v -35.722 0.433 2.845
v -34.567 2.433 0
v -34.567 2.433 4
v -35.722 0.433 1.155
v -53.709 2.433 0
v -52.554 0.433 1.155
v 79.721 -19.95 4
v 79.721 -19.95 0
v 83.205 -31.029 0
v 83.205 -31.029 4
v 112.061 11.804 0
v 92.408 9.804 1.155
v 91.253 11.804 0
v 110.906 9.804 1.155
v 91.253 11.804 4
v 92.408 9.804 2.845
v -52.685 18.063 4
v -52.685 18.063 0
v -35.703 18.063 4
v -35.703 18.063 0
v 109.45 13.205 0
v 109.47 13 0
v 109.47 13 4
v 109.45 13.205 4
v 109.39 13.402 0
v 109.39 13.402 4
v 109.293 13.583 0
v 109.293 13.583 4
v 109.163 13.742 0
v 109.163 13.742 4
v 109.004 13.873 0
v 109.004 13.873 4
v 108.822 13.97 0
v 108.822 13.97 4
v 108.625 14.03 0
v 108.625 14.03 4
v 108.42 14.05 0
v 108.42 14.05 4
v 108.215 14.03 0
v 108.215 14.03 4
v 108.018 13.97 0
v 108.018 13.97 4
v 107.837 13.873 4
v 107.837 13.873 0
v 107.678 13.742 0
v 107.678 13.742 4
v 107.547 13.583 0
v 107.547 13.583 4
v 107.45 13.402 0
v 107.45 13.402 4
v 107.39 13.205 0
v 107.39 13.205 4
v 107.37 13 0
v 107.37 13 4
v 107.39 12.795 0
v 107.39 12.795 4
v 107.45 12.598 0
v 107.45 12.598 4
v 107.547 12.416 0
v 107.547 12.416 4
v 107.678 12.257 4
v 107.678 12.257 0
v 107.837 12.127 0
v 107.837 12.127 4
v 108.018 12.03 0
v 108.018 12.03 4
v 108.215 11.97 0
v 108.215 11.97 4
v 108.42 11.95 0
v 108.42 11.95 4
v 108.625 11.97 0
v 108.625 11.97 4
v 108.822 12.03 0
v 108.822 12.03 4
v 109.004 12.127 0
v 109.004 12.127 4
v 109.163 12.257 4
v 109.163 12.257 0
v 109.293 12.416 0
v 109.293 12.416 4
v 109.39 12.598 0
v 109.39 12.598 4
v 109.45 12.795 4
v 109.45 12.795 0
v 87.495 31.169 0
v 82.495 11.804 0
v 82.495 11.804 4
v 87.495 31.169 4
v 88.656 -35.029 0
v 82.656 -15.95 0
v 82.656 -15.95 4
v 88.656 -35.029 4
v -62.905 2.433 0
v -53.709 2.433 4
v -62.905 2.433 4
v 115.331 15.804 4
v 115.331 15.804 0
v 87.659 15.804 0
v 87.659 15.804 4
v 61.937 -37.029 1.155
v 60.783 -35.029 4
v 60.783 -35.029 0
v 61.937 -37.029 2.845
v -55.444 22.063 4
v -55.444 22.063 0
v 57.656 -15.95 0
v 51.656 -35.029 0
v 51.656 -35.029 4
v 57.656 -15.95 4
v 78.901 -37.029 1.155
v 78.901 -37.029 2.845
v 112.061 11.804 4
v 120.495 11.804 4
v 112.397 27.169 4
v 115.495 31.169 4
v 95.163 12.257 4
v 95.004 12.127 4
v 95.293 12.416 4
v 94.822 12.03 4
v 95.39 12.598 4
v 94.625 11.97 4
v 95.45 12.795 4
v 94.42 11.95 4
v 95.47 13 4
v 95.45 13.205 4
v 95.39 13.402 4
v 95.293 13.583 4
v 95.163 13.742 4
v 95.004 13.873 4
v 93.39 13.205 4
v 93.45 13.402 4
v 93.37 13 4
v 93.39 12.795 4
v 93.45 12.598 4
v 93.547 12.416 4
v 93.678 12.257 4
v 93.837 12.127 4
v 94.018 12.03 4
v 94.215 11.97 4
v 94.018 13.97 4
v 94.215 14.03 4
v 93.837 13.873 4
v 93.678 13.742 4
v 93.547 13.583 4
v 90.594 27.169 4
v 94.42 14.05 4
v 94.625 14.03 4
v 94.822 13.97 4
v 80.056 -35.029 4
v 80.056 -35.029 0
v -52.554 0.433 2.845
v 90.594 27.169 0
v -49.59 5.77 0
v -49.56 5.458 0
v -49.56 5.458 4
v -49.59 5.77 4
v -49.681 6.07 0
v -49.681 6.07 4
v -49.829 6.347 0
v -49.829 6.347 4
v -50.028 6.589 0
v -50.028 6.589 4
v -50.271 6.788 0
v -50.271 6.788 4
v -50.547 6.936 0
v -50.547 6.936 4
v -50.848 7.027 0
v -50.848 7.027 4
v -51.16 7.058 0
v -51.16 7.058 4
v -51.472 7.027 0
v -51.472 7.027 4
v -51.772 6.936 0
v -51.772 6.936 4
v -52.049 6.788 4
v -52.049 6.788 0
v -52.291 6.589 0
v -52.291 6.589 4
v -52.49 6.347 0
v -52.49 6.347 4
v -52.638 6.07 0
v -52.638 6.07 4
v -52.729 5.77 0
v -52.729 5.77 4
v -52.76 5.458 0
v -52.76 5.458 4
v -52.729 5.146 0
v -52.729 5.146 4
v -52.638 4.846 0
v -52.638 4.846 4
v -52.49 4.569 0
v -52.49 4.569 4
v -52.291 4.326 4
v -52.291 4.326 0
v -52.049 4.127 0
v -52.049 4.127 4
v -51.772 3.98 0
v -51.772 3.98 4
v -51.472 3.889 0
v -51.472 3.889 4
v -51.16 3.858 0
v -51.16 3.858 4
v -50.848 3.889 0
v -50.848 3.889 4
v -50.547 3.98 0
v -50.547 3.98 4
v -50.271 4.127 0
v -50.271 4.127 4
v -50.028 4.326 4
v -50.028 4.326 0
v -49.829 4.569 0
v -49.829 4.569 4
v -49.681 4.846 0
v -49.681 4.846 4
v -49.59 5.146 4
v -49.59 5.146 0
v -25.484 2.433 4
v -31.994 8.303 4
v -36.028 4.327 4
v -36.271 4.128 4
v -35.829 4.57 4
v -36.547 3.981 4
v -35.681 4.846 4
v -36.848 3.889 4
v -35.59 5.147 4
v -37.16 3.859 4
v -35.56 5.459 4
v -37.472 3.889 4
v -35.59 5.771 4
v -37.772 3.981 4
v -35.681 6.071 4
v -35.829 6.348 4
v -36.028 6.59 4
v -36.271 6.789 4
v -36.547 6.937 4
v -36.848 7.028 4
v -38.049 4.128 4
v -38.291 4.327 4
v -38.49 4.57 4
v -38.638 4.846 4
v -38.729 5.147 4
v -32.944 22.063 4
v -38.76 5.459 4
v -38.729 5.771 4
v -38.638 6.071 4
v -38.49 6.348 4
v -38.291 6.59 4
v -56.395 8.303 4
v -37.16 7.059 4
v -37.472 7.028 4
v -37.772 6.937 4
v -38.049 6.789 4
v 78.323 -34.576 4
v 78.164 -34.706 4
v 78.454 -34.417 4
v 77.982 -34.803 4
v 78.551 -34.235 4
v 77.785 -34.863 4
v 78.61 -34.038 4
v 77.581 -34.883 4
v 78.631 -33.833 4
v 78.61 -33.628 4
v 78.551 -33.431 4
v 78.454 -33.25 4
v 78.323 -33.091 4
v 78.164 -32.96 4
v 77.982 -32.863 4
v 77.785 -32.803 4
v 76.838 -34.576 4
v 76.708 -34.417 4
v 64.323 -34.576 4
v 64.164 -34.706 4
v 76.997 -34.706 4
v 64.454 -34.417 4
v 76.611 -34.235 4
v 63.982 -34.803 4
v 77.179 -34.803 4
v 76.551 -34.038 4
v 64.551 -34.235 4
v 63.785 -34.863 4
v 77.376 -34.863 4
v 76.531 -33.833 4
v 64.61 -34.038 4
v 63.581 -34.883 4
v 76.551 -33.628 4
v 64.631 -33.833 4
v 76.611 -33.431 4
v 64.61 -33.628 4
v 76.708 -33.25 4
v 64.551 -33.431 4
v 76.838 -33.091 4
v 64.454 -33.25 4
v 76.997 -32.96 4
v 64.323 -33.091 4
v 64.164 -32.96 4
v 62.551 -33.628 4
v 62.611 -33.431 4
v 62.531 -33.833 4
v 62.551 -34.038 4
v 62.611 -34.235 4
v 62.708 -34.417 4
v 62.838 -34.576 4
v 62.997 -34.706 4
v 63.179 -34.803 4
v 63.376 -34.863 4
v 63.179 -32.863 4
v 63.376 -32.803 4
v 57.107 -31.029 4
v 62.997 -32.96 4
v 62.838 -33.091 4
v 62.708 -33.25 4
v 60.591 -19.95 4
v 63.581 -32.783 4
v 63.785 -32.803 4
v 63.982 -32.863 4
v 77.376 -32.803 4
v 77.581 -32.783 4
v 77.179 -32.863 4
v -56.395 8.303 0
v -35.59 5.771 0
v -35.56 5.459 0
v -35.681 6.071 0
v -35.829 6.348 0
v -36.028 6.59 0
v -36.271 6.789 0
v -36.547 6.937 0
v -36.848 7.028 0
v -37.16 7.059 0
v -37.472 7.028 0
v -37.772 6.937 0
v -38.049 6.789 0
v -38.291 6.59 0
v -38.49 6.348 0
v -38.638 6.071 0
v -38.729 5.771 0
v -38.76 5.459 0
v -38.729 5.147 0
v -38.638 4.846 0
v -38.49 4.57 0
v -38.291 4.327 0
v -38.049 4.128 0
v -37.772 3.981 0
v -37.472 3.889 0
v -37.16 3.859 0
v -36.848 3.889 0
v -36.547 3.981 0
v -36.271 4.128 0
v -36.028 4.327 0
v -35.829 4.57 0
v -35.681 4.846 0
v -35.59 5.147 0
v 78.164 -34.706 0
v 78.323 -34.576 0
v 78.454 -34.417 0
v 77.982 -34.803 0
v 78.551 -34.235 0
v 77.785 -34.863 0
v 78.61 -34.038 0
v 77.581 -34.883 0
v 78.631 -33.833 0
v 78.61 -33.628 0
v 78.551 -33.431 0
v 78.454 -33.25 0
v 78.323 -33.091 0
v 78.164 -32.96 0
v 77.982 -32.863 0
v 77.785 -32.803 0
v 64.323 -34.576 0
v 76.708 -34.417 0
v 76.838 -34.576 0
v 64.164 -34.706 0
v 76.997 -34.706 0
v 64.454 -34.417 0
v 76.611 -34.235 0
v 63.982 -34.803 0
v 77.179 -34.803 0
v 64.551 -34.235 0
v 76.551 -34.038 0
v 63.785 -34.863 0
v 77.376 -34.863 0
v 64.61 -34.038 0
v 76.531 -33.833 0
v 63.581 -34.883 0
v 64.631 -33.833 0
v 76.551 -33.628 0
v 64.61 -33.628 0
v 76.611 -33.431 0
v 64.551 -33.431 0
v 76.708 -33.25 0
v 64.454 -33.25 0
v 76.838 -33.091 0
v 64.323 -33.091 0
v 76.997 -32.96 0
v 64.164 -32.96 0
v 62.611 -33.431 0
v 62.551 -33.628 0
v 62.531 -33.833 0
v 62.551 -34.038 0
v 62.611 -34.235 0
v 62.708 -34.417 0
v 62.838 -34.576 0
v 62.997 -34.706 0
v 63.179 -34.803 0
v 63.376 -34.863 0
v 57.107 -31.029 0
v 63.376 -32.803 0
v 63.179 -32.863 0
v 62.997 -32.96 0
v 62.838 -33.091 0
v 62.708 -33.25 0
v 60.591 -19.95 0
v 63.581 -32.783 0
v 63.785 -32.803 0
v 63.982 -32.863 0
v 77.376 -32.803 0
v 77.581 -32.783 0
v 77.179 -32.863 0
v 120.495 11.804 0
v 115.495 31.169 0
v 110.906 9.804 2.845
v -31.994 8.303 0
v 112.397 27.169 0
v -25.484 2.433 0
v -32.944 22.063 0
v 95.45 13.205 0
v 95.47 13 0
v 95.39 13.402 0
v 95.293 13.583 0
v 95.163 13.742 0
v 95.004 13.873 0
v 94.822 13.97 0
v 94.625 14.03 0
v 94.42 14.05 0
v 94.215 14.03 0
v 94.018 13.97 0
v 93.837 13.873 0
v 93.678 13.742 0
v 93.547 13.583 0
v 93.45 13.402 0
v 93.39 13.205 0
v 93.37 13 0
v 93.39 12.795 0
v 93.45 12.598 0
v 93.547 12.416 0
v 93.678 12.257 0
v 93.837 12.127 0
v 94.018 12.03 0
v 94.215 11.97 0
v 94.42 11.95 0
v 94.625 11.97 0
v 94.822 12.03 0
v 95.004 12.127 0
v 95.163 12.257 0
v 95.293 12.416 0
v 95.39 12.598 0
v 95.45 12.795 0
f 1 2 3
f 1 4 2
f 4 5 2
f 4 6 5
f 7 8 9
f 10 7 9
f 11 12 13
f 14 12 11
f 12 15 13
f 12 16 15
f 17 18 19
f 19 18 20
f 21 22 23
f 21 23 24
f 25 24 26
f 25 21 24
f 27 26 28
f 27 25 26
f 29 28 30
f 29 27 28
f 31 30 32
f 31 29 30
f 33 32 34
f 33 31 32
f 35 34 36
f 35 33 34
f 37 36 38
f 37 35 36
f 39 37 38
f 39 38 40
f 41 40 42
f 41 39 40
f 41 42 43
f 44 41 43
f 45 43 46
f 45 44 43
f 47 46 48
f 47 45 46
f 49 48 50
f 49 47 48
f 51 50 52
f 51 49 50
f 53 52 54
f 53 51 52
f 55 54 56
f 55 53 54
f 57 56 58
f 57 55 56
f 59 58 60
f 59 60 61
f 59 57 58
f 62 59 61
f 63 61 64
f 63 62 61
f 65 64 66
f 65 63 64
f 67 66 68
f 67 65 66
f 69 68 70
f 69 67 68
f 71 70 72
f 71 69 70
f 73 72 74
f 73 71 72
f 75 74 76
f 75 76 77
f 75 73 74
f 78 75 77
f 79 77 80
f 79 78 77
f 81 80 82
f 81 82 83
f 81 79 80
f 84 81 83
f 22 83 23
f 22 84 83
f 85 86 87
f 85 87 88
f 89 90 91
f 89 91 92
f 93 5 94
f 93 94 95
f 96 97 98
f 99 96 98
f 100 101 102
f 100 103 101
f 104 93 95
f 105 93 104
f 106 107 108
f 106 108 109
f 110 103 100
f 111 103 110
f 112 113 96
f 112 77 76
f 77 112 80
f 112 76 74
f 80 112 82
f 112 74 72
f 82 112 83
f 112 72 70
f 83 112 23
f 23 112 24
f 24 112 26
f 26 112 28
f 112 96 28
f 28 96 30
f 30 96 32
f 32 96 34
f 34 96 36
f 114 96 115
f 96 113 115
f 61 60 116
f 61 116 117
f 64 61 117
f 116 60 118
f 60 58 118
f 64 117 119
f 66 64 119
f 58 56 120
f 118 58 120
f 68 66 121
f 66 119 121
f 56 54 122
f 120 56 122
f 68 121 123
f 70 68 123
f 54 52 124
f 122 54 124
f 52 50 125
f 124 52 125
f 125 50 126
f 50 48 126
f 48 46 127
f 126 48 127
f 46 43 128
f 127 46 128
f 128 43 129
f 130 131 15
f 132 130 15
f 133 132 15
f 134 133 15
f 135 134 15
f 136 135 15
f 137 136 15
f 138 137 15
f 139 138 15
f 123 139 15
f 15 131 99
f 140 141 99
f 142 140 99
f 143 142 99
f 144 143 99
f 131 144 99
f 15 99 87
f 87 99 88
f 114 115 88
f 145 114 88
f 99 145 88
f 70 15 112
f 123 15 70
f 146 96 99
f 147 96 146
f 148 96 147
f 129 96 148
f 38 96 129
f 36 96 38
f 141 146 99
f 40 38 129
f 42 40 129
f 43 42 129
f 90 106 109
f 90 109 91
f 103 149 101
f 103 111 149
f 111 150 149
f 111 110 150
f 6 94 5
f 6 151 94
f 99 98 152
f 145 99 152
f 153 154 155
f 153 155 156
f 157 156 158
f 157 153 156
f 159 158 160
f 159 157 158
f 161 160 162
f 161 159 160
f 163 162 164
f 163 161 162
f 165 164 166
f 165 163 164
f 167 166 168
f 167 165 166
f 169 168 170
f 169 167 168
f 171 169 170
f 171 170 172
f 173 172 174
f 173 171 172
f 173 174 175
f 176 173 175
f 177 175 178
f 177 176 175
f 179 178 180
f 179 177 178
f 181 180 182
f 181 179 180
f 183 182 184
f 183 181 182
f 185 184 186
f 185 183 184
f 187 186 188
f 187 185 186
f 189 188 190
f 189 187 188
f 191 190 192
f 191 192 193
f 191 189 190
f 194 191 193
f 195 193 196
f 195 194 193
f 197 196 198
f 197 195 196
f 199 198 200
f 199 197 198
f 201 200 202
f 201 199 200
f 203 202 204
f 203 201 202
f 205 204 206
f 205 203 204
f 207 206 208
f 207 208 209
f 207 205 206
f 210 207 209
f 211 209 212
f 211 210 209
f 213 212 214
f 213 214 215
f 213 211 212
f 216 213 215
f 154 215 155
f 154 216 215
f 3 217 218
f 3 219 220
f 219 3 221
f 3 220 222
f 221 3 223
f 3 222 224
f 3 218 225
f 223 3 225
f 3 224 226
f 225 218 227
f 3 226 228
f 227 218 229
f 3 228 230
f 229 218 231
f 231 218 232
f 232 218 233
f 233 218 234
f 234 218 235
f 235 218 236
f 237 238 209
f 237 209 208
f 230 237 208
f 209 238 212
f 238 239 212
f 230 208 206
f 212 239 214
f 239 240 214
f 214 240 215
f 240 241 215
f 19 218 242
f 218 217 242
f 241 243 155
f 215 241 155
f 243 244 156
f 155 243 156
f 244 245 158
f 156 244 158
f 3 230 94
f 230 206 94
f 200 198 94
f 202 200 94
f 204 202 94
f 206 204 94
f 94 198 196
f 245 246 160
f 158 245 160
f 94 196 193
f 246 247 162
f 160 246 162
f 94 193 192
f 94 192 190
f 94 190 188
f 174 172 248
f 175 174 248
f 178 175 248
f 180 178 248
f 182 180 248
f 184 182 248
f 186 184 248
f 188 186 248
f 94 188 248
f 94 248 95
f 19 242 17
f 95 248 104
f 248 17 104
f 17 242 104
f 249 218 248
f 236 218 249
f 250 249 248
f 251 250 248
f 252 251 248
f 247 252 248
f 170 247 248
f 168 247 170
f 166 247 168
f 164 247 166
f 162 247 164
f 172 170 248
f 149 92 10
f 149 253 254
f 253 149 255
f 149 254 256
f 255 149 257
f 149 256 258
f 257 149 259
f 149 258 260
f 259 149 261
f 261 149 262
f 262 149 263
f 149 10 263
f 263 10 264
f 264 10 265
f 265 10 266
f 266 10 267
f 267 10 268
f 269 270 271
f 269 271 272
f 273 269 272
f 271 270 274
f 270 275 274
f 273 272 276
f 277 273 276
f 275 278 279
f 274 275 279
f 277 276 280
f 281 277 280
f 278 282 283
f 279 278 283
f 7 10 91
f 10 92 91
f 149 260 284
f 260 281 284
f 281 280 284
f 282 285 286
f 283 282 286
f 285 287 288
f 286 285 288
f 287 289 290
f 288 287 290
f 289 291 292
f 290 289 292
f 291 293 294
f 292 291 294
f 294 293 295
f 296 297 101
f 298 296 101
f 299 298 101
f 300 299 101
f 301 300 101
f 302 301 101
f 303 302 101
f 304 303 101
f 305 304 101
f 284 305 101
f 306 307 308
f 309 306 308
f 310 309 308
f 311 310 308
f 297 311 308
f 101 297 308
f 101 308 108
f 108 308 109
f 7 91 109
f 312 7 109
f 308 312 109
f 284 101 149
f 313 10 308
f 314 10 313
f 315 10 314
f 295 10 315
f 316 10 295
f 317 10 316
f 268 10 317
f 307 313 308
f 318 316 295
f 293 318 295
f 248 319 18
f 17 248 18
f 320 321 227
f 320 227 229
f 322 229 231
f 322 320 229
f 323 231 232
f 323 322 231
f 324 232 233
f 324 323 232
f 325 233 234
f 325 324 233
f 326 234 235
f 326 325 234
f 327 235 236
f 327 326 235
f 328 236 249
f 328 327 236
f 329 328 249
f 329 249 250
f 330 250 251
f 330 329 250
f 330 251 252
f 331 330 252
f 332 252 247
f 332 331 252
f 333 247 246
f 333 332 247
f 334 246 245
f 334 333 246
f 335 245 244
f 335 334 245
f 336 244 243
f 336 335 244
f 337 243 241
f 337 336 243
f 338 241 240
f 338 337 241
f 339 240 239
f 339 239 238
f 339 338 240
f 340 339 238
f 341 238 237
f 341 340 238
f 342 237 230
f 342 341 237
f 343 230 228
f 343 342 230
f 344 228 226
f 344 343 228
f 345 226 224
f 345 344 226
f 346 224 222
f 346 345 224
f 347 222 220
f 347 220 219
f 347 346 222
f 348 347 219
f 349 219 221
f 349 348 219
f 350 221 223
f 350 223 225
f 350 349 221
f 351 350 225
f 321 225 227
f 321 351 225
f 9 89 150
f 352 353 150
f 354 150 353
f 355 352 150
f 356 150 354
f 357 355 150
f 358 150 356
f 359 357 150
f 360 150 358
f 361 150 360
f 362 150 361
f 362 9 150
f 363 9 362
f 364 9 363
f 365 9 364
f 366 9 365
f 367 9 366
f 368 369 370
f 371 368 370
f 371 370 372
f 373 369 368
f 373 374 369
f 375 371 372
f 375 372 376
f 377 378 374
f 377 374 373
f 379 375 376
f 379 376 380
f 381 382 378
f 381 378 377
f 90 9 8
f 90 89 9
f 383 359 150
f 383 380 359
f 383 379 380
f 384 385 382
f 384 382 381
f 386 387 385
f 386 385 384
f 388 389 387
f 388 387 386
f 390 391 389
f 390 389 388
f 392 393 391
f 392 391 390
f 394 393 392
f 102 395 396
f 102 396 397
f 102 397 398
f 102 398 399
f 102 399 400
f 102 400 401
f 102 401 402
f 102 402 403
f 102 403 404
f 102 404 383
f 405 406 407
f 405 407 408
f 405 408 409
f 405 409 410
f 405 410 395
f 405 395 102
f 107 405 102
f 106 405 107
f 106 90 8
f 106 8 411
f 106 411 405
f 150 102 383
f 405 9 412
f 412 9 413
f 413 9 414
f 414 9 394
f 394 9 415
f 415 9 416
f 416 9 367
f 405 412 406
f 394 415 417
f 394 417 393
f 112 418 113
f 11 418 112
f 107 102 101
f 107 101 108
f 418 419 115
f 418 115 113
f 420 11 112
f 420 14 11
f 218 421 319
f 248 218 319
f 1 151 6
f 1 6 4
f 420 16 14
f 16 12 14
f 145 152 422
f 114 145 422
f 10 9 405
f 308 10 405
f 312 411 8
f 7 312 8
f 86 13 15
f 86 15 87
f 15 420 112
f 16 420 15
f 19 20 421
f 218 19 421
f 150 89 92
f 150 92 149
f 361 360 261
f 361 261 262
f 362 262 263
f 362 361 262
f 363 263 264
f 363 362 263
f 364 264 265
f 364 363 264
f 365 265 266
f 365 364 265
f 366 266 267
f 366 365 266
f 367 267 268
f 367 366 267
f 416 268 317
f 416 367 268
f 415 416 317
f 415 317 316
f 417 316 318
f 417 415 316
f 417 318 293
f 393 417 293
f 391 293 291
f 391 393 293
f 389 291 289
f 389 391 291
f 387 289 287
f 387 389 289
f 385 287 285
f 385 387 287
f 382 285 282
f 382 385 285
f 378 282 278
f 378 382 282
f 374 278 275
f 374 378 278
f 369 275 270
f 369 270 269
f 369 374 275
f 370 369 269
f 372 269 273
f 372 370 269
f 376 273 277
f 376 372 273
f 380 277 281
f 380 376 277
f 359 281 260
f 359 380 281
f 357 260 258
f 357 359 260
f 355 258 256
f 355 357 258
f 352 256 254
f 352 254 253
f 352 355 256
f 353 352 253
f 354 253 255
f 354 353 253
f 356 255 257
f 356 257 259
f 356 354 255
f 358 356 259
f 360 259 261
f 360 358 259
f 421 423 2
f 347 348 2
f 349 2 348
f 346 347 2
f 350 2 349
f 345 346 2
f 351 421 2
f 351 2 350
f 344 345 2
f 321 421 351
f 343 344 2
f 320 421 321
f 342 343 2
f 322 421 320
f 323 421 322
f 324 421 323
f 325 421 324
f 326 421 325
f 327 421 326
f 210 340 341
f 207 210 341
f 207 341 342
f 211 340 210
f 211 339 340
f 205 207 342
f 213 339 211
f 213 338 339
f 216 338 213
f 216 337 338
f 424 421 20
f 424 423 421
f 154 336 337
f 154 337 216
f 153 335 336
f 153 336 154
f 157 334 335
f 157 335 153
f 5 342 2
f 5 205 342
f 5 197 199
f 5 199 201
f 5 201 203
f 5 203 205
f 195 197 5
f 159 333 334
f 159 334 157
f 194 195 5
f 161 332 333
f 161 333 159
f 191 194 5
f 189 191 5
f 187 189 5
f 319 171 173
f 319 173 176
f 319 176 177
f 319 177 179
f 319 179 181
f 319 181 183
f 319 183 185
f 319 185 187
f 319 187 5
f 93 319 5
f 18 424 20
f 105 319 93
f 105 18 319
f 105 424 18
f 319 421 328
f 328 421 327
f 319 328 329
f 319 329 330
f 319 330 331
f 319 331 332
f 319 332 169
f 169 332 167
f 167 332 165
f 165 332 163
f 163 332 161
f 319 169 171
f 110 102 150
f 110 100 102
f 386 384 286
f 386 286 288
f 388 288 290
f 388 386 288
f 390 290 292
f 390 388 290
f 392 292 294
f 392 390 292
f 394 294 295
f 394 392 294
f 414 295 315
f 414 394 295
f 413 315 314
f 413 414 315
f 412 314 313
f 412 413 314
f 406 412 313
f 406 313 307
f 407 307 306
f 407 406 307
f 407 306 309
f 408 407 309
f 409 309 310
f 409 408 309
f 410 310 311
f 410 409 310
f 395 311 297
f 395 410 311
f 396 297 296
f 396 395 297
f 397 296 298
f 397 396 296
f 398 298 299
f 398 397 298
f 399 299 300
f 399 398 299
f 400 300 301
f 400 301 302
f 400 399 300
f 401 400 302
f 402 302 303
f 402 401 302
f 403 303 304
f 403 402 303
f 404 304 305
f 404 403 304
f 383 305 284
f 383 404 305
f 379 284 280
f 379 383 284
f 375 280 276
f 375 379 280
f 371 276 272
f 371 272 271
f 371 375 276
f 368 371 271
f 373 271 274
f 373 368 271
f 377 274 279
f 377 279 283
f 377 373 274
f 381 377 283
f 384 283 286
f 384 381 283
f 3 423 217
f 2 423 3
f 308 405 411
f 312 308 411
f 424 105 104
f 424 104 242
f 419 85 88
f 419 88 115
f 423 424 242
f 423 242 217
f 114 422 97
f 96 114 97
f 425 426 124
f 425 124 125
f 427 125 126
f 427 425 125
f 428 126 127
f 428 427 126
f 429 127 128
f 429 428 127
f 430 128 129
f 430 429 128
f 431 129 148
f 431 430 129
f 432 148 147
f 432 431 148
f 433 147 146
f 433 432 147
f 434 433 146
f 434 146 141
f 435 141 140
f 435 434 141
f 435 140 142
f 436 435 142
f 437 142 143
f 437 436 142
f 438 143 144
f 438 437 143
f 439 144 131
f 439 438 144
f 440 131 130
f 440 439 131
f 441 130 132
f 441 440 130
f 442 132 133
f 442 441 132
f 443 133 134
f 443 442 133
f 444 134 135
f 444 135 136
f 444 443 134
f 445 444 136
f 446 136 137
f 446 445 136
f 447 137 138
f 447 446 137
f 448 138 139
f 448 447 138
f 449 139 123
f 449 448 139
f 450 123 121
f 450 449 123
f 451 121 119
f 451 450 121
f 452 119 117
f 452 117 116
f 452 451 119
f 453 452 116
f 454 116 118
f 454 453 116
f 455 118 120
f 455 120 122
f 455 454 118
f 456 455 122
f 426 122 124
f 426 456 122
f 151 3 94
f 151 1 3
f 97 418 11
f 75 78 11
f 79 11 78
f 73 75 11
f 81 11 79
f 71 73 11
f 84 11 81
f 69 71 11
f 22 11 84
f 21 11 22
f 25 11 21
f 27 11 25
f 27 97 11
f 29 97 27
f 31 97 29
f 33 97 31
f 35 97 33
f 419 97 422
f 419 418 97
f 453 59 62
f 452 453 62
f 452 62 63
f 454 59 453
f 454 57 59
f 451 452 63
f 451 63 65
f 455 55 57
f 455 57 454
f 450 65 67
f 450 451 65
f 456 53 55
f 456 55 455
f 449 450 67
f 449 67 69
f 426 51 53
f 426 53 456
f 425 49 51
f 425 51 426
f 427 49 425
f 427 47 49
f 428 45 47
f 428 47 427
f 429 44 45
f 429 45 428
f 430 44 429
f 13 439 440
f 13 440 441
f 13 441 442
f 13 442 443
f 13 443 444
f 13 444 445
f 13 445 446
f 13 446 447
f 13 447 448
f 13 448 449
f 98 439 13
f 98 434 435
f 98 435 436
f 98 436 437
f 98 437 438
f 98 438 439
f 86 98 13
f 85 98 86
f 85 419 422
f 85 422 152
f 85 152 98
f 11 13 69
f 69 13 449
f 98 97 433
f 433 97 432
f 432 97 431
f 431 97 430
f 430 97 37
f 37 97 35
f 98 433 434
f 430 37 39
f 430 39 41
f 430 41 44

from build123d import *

# Parameters (mm, degrees)
SKETCH1_R             = 1.6
BOSS_EXTRUDE1_DEPTH   = 4
SKETCH1_R_2           = 1.05
BOSS_EXTRUDE1_2_DEPTH = 4
BOSS_EXTRUDE1_3_DEPTH = 4
SKETCH2_W             = 19.141460354
SKETCH2_H             = 4
BOSS_EXTRUDE2_DEPTH   = 2
BOSS_EXTRUDE2_TAPER   = 30
SKETCH3_W             = 20.807734038
SKETCH3_H             = 4
BOSS_EXTRUDE3_DEPTH   = 2
BOSS_EXTRUDE3_TAPER   = 30
SKETCH4_W             = 19.273334359
SKETCH4_H             = 4
BOSS_EXTRUDE4_DEPTH   = 2
BOSS_EXTRUDE4_TAPER   = 30


with BuildPart() as part:
    # Sketch1 → Boss-Extrude1 (new body)
    with BuildSketch(Plane.XY):
        Polygon((-55.444244203, 22.063226417), (-32.944244203, 22.063226417), (-25.483717887, 2.433133521), (-62.904770519, 2.433133521), align=None)
        with Locations((-51.159681031, 5.4578108)):
            Circle(SKETCH1_R, mode=Mode.SUBTRACT)
        with Locations((-37.15968106, 5.458714772)):
            Circle(SKETCH1_R, mode=Mode.SUBTRACT)
        Polygon((-52.685322224, 18.063226417), (-35.703166182, 18.063226417), (-31.993610812, 8.302666178), (-56.394877594, 8.302666178), align=None, mode=Mode.SUBTRACT)
    extrude(amount=BOSS_EXTRUDE1_DEPTH)

    # Sketch2 → Boss-Extrude2 (add)
    with BuildSketch(Plane.XZ.offset(-2.433133521)):
        with Locations((-44.138002497, 2)):
            Rectangle(SKETCH2_W, SKETCH2_H)
    extrude(amount=BOSS_EXTRUDE2_DEPTH, taper=BOSS_EXTRUDE2_TAPER)


with BuildPart() as body_2:
    # Sketch1 → Boss-Extrude1 2 (new body)
    with BuildSketch(Plane.XY):
        Polygon((87.495445367, 31.168760327), (115.495445367, 31.168760327), (120.495445367, 11.803843596), (82.495445367, 11.803843596), align=None)
        with Locations((94.420291335, 12.999756858)):
            Circle(SKETCH1_R_2, mode=Mode.SUBTRACT)
        with Locations((108.420291335, 12.999750534)):
            Circle(SKETCH1_R_2, mode=Mode.SUBTRACT)
        Polygon((90.593832044, 27.168760327), (112.39705869, 27.168760327), (115.331467572, 15.803843596), (87.659423162, 15.803843596), align=None, mode=Mode.SUBTRACT)
    extrude(amount=BOSS_EXTRUDE1_2_DEPTH)

    # Sketch3 → Boss-Extrude3 (add)
    with BuildSketch(Plane.XZ.offset(-11.803843596)):
        with Locations((101.657236315, 2)):
            Rectangle(SKETCH3_W, SKETCH3_H)
    extrude(amount=BOSS_EXTRUDE3_DEPTH, taper=BOSS_EXTRUDE3_TAPER)


with BuildPart() as body_3:
    # Sketch1 → Boss-Extrude1 3 (new body)
    with BuildSketch(Plane.XY):
        Polygon((57.655749748, -15.95040789), (82.655749748, -15.95040789), (88.655749748, -35.029191918), (51.655749748, -35.029191918), align=None)
        with Locations((63.580595716, -33.833278656)):
            Circle(SKETCH1_R_2, mode=Mode.SUBTRACT)
        with Locations((77.580595716, -33.83328498)):
            Circle(SKETCH1_R_2, mode=Mode.SUBTRACT)
        Polygon((60.59094729, -19.95040789), (79.720552205, -19.95040789), (83.204668597, -31.029191918), (57.106830899, -31.029191918), align=None, mode=Mode.SUBTRACT)
    extrude(amount=BOSS_EXTRUDE1_3_DEPTH)

    # Sketch4 → Boss-Extrude4 (add)
    with BuildSketch(Plane.XZ.offset(35.029191918)):
        with Locations((70.419180003, 2)):
            Rectangle(SKETCH4_W, SKETCH4_H)
    extrude(amount=BOSS_EXTRUDE4_DEPTH, taper=BOSS_EXTRUDE4_TAPER)


solid = Compound([part.part, body_2.part, body_3.part])
